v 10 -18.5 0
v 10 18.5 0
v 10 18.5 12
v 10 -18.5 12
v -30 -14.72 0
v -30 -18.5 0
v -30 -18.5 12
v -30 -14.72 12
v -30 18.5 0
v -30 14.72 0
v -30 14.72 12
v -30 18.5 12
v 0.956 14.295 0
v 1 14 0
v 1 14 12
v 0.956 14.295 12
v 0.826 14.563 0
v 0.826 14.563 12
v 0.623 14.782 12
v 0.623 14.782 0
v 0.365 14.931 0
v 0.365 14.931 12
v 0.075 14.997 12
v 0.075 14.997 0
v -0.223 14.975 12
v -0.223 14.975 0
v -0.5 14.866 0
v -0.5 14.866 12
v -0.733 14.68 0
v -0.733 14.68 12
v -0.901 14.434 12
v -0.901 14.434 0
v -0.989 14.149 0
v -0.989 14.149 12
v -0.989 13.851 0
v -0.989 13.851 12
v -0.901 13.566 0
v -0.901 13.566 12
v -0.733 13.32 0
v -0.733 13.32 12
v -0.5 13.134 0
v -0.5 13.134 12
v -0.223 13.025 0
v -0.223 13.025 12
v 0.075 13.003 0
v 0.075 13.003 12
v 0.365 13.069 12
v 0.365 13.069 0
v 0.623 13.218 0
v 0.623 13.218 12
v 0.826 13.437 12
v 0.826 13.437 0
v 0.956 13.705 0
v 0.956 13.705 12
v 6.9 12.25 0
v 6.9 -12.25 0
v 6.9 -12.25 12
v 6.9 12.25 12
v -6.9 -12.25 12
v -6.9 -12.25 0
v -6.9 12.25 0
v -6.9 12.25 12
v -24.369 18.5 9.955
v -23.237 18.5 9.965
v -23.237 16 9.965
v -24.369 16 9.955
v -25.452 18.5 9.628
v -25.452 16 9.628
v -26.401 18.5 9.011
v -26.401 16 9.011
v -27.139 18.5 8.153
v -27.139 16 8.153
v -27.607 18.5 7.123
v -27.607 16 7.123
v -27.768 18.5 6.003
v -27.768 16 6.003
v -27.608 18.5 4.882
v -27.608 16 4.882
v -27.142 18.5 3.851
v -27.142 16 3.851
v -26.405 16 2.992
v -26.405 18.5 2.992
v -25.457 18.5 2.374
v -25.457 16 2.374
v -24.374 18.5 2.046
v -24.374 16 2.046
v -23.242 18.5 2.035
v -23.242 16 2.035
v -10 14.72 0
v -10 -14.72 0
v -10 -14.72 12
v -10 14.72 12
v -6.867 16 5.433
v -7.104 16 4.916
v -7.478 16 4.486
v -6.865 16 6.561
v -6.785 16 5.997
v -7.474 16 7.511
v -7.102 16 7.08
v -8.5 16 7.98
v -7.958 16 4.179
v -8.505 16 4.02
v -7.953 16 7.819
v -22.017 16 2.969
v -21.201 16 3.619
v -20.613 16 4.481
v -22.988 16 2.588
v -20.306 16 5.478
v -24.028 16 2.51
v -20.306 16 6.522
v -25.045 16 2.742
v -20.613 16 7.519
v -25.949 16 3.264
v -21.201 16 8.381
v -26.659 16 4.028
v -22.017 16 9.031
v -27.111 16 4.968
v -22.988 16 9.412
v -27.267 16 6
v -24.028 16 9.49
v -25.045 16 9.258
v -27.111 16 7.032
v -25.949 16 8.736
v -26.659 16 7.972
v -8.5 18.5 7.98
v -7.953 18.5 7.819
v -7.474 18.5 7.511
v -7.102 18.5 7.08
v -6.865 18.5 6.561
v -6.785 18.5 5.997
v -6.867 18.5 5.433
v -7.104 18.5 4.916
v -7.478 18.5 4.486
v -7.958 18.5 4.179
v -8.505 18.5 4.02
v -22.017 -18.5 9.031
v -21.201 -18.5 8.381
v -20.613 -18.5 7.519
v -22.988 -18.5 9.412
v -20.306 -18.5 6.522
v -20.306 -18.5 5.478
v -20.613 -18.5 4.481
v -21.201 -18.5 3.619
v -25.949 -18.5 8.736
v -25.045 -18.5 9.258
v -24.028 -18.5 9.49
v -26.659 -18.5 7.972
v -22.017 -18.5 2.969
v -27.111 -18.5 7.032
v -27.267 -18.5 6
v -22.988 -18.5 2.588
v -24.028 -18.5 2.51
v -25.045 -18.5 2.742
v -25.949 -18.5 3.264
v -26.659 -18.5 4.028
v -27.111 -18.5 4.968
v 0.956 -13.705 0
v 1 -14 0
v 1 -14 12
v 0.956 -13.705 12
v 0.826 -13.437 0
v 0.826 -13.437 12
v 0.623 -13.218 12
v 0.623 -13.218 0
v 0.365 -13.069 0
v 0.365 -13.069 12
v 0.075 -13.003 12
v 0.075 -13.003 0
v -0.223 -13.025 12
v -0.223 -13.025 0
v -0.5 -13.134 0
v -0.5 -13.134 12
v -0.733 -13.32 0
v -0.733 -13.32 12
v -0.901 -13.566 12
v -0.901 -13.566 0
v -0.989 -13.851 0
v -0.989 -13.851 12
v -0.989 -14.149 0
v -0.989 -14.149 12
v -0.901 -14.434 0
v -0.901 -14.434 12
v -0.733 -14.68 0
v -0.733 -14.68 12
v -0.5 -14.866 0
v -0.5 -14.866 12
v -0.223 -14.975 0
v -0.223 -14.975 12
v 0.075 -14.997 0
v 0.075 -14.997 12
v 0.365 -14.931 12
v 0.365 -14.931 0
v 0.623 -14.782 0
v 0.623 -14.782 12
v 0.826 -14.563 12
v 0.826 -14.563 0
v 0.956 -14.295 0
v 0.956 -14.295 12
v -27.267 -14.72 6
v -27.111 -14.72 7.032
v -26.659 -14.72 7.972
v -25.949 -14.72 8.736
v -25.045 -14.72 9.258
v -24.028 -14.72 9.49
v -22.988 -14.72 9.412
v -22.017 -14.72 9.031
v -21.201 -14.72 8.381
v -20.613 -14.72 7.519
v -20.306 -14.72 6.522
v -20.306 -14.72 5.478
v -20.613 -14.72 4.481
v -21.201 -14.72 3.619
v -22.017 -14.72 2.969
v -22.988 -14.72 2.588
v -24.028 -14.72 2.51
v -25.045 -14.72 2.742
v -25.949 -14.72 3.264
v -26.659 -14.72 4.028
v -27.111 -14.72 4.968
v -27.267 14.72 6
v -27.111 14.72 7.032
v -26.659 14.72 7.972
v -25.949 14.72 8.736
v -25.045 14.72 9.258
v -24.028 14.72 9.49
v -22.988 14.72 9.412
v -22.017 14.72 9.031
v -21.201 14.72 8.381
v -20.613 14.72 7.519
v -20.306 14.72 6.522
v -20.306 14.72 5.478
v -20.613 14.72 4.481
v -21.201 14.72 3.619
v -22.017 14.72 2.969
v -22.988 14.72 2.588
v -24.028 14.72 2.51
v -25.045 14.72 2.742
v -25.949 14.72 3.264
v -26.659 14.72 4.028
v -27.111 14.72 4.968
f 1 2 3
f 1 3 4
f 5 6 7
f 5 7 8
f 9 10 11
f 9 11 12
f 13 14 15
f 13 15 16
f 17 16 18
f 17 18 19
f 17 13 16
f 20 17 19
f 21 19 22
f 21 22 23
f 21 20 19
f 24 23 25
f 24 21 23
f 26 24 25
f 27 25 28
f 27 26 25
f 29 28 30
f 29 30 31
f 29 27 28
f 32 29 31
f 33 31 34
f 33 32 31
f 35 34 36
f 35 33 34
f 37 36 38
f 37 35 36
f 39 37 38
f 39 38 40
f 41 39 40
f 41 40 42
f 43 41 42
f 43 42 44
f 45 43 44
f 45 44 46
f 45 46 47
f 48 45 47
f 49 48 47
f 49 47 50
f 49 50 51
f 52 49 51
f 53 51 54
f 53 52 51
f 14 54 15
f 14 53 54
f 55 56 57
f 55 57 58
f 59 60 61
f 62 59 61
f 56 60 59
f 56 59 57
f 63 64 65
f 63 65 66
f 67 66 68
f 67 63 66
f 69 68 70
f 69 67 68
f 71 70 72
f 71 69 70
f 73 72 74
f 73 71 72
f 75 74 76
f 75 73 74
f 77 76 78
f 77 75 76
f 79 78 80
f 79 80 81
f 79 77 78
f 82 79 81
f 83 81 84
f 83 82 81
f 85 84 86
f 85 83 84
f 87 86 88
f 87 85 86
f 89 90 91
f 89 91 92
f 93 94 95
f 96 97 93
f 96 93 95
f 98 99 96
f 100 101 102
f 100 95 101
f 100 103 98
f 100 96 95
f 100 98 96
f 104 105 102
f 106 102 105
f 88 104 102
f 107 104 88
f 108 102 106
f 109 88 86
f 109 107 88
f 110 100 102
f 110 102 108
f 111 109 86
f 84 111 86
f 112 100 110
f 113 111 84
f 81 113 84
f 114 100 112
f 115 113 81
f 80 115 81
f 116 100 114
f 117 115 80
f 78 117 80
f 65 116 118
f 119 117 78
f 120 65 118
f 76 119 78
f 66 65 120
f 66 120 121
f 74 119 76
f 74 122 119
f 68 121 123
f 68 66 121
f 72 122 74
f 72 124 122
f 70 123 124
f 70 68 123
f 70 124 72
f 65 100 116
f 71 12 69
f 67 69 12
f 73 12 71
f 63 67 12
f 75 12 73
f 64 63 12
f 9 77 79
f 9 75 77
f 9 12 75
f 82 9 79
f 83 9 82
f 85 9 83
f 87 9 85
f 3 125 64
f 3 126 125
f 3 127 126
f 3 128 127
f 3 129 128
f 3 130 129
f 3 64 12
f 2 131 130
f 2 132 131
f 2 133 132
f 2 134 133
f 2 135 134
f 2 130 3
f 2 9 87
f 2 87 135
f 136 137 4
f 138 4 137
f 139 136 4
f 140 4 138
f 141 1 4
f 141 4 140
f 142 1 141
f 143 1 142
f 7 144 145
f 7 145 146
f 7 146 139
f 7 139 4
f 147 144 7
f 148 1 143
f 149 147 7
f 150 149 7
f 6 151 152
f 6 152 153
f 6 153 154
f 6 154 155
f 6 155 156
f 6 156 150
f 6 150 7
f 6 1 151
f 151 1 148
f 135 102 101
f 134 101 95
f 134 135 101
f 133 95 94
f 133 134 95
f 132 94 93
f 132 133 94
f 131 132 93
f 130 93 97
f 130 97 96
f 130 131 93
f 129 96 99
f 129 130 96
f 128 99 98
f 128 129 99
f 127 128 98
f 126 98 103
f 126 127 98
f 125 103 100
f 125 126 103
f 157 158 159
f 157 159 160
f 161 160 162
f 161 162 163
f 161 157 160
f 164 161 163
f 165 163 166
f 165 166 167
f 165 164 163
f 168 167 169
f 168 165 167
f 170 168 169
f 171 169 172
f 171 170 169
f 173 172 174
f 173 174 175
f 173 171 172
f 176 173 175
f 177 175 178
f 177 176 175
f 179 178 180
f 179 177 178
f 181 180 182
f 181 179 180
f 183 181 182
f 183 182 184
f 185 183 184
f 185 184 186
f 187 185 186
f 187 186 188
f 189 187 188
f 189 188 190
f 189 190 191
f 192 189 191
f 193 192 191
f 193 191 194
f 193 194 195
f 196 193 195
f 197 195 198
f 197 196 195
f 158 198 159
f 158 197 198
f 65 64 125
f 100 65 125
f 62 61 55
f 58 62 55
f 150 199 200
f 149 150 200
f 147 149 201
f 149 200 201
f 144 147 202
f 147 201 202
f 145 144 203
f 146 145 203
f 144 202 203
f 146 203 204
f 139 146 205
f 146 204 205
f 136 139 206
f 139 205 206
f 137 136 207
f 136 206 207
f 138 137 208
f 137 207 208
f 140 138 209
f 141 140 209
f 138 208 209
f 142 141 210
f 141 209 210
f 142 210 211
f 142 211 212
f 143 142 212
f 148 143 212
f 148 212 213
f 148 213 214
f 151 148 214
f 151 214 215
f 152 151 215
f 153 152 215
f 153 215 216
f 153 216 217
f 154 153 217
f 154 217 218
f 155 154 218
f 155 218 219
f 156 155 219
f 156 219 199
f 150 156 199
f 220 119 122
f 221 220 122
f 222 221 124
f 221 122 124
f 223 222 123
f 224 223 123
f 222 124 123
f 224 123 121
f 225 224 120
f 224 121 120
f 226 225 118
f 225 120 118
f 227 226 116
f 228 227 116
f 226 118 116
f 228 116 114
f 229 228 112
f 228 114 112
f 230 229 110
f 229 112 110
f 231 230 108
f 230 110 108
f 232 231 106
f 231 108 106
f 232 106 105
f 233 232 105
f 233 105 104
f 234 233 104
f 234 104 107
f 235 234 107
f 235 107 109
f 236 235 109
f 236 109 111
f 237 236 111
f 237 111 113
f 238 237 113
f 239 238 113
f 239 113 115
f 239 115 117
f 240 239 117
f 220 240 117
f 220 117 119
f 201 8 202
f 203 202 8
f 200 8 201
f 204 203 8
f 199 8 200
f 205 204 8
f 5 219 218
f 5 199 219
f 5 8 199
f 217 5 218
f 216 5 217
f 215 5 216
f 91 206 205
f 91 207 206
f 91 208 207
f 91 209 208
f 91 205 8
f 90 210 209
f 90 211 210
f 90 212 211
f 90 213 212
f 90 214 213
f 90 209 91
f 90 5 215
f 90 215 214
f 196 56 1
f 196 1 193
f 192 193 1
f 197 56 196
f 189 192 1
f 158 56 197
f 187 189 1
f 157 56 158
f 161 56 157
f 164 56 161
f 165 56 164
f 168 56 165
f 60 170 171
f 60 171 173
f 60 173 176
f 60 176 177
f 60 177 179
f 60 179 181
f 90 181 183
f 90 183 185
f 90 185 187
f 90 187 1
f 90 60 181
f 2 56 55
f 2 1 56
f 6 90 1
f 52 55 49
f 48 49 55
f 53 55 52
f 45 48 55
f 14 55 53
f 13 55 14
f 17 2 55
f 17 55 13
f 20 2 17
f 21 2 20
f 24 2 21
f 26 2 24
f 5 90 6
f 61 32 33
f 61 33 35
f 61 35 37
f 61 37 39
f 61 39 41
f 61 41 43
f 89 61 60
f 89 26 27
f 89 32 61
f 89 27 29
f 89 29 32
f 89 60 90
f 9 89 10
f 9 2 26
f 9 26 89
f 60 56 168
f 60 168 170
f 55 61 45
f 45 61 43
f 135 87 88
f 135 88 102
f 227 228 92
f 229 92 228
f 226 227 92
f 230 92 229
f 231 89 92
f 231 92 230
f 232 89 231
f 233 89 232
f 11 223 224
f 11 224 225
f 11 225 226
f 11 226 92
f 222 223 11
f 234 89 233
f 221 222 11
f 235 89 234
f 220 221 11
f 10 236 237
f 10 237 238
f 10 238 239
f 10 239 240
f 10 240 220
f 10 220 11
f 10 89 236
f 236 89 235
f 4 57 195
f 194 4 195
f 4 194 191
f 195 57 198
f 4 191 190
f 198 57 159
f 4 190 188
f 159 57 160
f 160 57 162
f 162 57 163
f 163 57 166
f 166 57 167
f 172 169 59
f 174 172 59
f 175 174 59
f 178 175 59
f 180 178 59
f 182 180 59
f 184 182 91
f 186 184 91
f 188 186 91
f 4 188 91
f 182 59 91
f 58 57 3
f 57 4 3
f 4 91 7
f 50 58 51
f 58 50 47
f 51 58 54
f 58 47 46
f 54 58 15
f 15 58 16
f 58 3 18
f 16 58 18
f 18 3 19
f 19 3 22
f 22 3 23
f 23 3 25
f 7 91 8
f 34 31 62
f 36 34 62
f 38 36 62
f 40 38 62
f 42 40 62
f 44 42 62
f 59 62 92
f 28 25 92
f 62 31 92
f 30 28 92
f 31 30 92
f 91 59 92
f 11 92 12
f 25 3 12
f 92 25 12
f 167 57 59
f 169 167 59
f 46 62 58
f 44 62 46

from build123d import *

# Parameters (mm, degrees)
SKETCH_R        = 1
SKETCH_W        = 13.8
SKETCH_H        = 24.5
PAD_DEPTH       = 12
SKETCH001_R     = 3.5
POCKET_DEPTH    = 37.001
POCKET001_DEPTH = 3


with BuildPart() as part:
    # Sketch → Pad (new body)
    with BuildSketch(Plane.XY):
        Polygon((-30, 18.5), (10, 18.5), (10, -18.5), (-30, -18.5), (-30, -14.719735), (-10, -14.719735), (-10, 14.719735), (-30, 14.719735), align=None)
        with Locations((0, -14)):
            Circle(SKETCH_R, mode=Mode.SUBTRACT)
        with Locations((0, 14)):
            Circle(SKETCH_R, mode=Mode.SUBTRACT)
        Rectangle(SKETCH_W, SKETCH_H, mode=Mode.SUBTRACT)
    extrude(amount=PAD_DEPTH)

    # Sketch001 (on Face2 of Pad) → Pocket (cut, through all)
    with BuildSketch(Plane(origin=(0, 18.5, 0), x_dir=(-1, 0, 0), z_dir=(0, 1, 0))):
        with Locations((23.76671, 6)):
            Circle(SKETCH001_R)
    extrude(amount=-POCKET_DEPTH, mode=Mode.SUBTRACT)

    # Sketch002 → Pocket001 (cut)
    with BuildSketch(Plane.XZ.offset(-19)):
        with BuildLine():
            Line((-23.237058, 9.964646), (-8.500146, 7.979621))
            ThreePointArc((-8.505437, 4.019625), (-6.784928, 5.997328), (-8.500146, 7.979621))
            Line((-23.242355, 2.034648), (-8.505437, 4.019625))
            ThreePointArc((-23.237058, 9.964646), (-27.767697, 6.002672), (-23.242355, 2.034648))
        make_face()
    extrude(amount=POCKET001_DEPTH, mode=Mode.SUBTRACT)


solid = part.part
